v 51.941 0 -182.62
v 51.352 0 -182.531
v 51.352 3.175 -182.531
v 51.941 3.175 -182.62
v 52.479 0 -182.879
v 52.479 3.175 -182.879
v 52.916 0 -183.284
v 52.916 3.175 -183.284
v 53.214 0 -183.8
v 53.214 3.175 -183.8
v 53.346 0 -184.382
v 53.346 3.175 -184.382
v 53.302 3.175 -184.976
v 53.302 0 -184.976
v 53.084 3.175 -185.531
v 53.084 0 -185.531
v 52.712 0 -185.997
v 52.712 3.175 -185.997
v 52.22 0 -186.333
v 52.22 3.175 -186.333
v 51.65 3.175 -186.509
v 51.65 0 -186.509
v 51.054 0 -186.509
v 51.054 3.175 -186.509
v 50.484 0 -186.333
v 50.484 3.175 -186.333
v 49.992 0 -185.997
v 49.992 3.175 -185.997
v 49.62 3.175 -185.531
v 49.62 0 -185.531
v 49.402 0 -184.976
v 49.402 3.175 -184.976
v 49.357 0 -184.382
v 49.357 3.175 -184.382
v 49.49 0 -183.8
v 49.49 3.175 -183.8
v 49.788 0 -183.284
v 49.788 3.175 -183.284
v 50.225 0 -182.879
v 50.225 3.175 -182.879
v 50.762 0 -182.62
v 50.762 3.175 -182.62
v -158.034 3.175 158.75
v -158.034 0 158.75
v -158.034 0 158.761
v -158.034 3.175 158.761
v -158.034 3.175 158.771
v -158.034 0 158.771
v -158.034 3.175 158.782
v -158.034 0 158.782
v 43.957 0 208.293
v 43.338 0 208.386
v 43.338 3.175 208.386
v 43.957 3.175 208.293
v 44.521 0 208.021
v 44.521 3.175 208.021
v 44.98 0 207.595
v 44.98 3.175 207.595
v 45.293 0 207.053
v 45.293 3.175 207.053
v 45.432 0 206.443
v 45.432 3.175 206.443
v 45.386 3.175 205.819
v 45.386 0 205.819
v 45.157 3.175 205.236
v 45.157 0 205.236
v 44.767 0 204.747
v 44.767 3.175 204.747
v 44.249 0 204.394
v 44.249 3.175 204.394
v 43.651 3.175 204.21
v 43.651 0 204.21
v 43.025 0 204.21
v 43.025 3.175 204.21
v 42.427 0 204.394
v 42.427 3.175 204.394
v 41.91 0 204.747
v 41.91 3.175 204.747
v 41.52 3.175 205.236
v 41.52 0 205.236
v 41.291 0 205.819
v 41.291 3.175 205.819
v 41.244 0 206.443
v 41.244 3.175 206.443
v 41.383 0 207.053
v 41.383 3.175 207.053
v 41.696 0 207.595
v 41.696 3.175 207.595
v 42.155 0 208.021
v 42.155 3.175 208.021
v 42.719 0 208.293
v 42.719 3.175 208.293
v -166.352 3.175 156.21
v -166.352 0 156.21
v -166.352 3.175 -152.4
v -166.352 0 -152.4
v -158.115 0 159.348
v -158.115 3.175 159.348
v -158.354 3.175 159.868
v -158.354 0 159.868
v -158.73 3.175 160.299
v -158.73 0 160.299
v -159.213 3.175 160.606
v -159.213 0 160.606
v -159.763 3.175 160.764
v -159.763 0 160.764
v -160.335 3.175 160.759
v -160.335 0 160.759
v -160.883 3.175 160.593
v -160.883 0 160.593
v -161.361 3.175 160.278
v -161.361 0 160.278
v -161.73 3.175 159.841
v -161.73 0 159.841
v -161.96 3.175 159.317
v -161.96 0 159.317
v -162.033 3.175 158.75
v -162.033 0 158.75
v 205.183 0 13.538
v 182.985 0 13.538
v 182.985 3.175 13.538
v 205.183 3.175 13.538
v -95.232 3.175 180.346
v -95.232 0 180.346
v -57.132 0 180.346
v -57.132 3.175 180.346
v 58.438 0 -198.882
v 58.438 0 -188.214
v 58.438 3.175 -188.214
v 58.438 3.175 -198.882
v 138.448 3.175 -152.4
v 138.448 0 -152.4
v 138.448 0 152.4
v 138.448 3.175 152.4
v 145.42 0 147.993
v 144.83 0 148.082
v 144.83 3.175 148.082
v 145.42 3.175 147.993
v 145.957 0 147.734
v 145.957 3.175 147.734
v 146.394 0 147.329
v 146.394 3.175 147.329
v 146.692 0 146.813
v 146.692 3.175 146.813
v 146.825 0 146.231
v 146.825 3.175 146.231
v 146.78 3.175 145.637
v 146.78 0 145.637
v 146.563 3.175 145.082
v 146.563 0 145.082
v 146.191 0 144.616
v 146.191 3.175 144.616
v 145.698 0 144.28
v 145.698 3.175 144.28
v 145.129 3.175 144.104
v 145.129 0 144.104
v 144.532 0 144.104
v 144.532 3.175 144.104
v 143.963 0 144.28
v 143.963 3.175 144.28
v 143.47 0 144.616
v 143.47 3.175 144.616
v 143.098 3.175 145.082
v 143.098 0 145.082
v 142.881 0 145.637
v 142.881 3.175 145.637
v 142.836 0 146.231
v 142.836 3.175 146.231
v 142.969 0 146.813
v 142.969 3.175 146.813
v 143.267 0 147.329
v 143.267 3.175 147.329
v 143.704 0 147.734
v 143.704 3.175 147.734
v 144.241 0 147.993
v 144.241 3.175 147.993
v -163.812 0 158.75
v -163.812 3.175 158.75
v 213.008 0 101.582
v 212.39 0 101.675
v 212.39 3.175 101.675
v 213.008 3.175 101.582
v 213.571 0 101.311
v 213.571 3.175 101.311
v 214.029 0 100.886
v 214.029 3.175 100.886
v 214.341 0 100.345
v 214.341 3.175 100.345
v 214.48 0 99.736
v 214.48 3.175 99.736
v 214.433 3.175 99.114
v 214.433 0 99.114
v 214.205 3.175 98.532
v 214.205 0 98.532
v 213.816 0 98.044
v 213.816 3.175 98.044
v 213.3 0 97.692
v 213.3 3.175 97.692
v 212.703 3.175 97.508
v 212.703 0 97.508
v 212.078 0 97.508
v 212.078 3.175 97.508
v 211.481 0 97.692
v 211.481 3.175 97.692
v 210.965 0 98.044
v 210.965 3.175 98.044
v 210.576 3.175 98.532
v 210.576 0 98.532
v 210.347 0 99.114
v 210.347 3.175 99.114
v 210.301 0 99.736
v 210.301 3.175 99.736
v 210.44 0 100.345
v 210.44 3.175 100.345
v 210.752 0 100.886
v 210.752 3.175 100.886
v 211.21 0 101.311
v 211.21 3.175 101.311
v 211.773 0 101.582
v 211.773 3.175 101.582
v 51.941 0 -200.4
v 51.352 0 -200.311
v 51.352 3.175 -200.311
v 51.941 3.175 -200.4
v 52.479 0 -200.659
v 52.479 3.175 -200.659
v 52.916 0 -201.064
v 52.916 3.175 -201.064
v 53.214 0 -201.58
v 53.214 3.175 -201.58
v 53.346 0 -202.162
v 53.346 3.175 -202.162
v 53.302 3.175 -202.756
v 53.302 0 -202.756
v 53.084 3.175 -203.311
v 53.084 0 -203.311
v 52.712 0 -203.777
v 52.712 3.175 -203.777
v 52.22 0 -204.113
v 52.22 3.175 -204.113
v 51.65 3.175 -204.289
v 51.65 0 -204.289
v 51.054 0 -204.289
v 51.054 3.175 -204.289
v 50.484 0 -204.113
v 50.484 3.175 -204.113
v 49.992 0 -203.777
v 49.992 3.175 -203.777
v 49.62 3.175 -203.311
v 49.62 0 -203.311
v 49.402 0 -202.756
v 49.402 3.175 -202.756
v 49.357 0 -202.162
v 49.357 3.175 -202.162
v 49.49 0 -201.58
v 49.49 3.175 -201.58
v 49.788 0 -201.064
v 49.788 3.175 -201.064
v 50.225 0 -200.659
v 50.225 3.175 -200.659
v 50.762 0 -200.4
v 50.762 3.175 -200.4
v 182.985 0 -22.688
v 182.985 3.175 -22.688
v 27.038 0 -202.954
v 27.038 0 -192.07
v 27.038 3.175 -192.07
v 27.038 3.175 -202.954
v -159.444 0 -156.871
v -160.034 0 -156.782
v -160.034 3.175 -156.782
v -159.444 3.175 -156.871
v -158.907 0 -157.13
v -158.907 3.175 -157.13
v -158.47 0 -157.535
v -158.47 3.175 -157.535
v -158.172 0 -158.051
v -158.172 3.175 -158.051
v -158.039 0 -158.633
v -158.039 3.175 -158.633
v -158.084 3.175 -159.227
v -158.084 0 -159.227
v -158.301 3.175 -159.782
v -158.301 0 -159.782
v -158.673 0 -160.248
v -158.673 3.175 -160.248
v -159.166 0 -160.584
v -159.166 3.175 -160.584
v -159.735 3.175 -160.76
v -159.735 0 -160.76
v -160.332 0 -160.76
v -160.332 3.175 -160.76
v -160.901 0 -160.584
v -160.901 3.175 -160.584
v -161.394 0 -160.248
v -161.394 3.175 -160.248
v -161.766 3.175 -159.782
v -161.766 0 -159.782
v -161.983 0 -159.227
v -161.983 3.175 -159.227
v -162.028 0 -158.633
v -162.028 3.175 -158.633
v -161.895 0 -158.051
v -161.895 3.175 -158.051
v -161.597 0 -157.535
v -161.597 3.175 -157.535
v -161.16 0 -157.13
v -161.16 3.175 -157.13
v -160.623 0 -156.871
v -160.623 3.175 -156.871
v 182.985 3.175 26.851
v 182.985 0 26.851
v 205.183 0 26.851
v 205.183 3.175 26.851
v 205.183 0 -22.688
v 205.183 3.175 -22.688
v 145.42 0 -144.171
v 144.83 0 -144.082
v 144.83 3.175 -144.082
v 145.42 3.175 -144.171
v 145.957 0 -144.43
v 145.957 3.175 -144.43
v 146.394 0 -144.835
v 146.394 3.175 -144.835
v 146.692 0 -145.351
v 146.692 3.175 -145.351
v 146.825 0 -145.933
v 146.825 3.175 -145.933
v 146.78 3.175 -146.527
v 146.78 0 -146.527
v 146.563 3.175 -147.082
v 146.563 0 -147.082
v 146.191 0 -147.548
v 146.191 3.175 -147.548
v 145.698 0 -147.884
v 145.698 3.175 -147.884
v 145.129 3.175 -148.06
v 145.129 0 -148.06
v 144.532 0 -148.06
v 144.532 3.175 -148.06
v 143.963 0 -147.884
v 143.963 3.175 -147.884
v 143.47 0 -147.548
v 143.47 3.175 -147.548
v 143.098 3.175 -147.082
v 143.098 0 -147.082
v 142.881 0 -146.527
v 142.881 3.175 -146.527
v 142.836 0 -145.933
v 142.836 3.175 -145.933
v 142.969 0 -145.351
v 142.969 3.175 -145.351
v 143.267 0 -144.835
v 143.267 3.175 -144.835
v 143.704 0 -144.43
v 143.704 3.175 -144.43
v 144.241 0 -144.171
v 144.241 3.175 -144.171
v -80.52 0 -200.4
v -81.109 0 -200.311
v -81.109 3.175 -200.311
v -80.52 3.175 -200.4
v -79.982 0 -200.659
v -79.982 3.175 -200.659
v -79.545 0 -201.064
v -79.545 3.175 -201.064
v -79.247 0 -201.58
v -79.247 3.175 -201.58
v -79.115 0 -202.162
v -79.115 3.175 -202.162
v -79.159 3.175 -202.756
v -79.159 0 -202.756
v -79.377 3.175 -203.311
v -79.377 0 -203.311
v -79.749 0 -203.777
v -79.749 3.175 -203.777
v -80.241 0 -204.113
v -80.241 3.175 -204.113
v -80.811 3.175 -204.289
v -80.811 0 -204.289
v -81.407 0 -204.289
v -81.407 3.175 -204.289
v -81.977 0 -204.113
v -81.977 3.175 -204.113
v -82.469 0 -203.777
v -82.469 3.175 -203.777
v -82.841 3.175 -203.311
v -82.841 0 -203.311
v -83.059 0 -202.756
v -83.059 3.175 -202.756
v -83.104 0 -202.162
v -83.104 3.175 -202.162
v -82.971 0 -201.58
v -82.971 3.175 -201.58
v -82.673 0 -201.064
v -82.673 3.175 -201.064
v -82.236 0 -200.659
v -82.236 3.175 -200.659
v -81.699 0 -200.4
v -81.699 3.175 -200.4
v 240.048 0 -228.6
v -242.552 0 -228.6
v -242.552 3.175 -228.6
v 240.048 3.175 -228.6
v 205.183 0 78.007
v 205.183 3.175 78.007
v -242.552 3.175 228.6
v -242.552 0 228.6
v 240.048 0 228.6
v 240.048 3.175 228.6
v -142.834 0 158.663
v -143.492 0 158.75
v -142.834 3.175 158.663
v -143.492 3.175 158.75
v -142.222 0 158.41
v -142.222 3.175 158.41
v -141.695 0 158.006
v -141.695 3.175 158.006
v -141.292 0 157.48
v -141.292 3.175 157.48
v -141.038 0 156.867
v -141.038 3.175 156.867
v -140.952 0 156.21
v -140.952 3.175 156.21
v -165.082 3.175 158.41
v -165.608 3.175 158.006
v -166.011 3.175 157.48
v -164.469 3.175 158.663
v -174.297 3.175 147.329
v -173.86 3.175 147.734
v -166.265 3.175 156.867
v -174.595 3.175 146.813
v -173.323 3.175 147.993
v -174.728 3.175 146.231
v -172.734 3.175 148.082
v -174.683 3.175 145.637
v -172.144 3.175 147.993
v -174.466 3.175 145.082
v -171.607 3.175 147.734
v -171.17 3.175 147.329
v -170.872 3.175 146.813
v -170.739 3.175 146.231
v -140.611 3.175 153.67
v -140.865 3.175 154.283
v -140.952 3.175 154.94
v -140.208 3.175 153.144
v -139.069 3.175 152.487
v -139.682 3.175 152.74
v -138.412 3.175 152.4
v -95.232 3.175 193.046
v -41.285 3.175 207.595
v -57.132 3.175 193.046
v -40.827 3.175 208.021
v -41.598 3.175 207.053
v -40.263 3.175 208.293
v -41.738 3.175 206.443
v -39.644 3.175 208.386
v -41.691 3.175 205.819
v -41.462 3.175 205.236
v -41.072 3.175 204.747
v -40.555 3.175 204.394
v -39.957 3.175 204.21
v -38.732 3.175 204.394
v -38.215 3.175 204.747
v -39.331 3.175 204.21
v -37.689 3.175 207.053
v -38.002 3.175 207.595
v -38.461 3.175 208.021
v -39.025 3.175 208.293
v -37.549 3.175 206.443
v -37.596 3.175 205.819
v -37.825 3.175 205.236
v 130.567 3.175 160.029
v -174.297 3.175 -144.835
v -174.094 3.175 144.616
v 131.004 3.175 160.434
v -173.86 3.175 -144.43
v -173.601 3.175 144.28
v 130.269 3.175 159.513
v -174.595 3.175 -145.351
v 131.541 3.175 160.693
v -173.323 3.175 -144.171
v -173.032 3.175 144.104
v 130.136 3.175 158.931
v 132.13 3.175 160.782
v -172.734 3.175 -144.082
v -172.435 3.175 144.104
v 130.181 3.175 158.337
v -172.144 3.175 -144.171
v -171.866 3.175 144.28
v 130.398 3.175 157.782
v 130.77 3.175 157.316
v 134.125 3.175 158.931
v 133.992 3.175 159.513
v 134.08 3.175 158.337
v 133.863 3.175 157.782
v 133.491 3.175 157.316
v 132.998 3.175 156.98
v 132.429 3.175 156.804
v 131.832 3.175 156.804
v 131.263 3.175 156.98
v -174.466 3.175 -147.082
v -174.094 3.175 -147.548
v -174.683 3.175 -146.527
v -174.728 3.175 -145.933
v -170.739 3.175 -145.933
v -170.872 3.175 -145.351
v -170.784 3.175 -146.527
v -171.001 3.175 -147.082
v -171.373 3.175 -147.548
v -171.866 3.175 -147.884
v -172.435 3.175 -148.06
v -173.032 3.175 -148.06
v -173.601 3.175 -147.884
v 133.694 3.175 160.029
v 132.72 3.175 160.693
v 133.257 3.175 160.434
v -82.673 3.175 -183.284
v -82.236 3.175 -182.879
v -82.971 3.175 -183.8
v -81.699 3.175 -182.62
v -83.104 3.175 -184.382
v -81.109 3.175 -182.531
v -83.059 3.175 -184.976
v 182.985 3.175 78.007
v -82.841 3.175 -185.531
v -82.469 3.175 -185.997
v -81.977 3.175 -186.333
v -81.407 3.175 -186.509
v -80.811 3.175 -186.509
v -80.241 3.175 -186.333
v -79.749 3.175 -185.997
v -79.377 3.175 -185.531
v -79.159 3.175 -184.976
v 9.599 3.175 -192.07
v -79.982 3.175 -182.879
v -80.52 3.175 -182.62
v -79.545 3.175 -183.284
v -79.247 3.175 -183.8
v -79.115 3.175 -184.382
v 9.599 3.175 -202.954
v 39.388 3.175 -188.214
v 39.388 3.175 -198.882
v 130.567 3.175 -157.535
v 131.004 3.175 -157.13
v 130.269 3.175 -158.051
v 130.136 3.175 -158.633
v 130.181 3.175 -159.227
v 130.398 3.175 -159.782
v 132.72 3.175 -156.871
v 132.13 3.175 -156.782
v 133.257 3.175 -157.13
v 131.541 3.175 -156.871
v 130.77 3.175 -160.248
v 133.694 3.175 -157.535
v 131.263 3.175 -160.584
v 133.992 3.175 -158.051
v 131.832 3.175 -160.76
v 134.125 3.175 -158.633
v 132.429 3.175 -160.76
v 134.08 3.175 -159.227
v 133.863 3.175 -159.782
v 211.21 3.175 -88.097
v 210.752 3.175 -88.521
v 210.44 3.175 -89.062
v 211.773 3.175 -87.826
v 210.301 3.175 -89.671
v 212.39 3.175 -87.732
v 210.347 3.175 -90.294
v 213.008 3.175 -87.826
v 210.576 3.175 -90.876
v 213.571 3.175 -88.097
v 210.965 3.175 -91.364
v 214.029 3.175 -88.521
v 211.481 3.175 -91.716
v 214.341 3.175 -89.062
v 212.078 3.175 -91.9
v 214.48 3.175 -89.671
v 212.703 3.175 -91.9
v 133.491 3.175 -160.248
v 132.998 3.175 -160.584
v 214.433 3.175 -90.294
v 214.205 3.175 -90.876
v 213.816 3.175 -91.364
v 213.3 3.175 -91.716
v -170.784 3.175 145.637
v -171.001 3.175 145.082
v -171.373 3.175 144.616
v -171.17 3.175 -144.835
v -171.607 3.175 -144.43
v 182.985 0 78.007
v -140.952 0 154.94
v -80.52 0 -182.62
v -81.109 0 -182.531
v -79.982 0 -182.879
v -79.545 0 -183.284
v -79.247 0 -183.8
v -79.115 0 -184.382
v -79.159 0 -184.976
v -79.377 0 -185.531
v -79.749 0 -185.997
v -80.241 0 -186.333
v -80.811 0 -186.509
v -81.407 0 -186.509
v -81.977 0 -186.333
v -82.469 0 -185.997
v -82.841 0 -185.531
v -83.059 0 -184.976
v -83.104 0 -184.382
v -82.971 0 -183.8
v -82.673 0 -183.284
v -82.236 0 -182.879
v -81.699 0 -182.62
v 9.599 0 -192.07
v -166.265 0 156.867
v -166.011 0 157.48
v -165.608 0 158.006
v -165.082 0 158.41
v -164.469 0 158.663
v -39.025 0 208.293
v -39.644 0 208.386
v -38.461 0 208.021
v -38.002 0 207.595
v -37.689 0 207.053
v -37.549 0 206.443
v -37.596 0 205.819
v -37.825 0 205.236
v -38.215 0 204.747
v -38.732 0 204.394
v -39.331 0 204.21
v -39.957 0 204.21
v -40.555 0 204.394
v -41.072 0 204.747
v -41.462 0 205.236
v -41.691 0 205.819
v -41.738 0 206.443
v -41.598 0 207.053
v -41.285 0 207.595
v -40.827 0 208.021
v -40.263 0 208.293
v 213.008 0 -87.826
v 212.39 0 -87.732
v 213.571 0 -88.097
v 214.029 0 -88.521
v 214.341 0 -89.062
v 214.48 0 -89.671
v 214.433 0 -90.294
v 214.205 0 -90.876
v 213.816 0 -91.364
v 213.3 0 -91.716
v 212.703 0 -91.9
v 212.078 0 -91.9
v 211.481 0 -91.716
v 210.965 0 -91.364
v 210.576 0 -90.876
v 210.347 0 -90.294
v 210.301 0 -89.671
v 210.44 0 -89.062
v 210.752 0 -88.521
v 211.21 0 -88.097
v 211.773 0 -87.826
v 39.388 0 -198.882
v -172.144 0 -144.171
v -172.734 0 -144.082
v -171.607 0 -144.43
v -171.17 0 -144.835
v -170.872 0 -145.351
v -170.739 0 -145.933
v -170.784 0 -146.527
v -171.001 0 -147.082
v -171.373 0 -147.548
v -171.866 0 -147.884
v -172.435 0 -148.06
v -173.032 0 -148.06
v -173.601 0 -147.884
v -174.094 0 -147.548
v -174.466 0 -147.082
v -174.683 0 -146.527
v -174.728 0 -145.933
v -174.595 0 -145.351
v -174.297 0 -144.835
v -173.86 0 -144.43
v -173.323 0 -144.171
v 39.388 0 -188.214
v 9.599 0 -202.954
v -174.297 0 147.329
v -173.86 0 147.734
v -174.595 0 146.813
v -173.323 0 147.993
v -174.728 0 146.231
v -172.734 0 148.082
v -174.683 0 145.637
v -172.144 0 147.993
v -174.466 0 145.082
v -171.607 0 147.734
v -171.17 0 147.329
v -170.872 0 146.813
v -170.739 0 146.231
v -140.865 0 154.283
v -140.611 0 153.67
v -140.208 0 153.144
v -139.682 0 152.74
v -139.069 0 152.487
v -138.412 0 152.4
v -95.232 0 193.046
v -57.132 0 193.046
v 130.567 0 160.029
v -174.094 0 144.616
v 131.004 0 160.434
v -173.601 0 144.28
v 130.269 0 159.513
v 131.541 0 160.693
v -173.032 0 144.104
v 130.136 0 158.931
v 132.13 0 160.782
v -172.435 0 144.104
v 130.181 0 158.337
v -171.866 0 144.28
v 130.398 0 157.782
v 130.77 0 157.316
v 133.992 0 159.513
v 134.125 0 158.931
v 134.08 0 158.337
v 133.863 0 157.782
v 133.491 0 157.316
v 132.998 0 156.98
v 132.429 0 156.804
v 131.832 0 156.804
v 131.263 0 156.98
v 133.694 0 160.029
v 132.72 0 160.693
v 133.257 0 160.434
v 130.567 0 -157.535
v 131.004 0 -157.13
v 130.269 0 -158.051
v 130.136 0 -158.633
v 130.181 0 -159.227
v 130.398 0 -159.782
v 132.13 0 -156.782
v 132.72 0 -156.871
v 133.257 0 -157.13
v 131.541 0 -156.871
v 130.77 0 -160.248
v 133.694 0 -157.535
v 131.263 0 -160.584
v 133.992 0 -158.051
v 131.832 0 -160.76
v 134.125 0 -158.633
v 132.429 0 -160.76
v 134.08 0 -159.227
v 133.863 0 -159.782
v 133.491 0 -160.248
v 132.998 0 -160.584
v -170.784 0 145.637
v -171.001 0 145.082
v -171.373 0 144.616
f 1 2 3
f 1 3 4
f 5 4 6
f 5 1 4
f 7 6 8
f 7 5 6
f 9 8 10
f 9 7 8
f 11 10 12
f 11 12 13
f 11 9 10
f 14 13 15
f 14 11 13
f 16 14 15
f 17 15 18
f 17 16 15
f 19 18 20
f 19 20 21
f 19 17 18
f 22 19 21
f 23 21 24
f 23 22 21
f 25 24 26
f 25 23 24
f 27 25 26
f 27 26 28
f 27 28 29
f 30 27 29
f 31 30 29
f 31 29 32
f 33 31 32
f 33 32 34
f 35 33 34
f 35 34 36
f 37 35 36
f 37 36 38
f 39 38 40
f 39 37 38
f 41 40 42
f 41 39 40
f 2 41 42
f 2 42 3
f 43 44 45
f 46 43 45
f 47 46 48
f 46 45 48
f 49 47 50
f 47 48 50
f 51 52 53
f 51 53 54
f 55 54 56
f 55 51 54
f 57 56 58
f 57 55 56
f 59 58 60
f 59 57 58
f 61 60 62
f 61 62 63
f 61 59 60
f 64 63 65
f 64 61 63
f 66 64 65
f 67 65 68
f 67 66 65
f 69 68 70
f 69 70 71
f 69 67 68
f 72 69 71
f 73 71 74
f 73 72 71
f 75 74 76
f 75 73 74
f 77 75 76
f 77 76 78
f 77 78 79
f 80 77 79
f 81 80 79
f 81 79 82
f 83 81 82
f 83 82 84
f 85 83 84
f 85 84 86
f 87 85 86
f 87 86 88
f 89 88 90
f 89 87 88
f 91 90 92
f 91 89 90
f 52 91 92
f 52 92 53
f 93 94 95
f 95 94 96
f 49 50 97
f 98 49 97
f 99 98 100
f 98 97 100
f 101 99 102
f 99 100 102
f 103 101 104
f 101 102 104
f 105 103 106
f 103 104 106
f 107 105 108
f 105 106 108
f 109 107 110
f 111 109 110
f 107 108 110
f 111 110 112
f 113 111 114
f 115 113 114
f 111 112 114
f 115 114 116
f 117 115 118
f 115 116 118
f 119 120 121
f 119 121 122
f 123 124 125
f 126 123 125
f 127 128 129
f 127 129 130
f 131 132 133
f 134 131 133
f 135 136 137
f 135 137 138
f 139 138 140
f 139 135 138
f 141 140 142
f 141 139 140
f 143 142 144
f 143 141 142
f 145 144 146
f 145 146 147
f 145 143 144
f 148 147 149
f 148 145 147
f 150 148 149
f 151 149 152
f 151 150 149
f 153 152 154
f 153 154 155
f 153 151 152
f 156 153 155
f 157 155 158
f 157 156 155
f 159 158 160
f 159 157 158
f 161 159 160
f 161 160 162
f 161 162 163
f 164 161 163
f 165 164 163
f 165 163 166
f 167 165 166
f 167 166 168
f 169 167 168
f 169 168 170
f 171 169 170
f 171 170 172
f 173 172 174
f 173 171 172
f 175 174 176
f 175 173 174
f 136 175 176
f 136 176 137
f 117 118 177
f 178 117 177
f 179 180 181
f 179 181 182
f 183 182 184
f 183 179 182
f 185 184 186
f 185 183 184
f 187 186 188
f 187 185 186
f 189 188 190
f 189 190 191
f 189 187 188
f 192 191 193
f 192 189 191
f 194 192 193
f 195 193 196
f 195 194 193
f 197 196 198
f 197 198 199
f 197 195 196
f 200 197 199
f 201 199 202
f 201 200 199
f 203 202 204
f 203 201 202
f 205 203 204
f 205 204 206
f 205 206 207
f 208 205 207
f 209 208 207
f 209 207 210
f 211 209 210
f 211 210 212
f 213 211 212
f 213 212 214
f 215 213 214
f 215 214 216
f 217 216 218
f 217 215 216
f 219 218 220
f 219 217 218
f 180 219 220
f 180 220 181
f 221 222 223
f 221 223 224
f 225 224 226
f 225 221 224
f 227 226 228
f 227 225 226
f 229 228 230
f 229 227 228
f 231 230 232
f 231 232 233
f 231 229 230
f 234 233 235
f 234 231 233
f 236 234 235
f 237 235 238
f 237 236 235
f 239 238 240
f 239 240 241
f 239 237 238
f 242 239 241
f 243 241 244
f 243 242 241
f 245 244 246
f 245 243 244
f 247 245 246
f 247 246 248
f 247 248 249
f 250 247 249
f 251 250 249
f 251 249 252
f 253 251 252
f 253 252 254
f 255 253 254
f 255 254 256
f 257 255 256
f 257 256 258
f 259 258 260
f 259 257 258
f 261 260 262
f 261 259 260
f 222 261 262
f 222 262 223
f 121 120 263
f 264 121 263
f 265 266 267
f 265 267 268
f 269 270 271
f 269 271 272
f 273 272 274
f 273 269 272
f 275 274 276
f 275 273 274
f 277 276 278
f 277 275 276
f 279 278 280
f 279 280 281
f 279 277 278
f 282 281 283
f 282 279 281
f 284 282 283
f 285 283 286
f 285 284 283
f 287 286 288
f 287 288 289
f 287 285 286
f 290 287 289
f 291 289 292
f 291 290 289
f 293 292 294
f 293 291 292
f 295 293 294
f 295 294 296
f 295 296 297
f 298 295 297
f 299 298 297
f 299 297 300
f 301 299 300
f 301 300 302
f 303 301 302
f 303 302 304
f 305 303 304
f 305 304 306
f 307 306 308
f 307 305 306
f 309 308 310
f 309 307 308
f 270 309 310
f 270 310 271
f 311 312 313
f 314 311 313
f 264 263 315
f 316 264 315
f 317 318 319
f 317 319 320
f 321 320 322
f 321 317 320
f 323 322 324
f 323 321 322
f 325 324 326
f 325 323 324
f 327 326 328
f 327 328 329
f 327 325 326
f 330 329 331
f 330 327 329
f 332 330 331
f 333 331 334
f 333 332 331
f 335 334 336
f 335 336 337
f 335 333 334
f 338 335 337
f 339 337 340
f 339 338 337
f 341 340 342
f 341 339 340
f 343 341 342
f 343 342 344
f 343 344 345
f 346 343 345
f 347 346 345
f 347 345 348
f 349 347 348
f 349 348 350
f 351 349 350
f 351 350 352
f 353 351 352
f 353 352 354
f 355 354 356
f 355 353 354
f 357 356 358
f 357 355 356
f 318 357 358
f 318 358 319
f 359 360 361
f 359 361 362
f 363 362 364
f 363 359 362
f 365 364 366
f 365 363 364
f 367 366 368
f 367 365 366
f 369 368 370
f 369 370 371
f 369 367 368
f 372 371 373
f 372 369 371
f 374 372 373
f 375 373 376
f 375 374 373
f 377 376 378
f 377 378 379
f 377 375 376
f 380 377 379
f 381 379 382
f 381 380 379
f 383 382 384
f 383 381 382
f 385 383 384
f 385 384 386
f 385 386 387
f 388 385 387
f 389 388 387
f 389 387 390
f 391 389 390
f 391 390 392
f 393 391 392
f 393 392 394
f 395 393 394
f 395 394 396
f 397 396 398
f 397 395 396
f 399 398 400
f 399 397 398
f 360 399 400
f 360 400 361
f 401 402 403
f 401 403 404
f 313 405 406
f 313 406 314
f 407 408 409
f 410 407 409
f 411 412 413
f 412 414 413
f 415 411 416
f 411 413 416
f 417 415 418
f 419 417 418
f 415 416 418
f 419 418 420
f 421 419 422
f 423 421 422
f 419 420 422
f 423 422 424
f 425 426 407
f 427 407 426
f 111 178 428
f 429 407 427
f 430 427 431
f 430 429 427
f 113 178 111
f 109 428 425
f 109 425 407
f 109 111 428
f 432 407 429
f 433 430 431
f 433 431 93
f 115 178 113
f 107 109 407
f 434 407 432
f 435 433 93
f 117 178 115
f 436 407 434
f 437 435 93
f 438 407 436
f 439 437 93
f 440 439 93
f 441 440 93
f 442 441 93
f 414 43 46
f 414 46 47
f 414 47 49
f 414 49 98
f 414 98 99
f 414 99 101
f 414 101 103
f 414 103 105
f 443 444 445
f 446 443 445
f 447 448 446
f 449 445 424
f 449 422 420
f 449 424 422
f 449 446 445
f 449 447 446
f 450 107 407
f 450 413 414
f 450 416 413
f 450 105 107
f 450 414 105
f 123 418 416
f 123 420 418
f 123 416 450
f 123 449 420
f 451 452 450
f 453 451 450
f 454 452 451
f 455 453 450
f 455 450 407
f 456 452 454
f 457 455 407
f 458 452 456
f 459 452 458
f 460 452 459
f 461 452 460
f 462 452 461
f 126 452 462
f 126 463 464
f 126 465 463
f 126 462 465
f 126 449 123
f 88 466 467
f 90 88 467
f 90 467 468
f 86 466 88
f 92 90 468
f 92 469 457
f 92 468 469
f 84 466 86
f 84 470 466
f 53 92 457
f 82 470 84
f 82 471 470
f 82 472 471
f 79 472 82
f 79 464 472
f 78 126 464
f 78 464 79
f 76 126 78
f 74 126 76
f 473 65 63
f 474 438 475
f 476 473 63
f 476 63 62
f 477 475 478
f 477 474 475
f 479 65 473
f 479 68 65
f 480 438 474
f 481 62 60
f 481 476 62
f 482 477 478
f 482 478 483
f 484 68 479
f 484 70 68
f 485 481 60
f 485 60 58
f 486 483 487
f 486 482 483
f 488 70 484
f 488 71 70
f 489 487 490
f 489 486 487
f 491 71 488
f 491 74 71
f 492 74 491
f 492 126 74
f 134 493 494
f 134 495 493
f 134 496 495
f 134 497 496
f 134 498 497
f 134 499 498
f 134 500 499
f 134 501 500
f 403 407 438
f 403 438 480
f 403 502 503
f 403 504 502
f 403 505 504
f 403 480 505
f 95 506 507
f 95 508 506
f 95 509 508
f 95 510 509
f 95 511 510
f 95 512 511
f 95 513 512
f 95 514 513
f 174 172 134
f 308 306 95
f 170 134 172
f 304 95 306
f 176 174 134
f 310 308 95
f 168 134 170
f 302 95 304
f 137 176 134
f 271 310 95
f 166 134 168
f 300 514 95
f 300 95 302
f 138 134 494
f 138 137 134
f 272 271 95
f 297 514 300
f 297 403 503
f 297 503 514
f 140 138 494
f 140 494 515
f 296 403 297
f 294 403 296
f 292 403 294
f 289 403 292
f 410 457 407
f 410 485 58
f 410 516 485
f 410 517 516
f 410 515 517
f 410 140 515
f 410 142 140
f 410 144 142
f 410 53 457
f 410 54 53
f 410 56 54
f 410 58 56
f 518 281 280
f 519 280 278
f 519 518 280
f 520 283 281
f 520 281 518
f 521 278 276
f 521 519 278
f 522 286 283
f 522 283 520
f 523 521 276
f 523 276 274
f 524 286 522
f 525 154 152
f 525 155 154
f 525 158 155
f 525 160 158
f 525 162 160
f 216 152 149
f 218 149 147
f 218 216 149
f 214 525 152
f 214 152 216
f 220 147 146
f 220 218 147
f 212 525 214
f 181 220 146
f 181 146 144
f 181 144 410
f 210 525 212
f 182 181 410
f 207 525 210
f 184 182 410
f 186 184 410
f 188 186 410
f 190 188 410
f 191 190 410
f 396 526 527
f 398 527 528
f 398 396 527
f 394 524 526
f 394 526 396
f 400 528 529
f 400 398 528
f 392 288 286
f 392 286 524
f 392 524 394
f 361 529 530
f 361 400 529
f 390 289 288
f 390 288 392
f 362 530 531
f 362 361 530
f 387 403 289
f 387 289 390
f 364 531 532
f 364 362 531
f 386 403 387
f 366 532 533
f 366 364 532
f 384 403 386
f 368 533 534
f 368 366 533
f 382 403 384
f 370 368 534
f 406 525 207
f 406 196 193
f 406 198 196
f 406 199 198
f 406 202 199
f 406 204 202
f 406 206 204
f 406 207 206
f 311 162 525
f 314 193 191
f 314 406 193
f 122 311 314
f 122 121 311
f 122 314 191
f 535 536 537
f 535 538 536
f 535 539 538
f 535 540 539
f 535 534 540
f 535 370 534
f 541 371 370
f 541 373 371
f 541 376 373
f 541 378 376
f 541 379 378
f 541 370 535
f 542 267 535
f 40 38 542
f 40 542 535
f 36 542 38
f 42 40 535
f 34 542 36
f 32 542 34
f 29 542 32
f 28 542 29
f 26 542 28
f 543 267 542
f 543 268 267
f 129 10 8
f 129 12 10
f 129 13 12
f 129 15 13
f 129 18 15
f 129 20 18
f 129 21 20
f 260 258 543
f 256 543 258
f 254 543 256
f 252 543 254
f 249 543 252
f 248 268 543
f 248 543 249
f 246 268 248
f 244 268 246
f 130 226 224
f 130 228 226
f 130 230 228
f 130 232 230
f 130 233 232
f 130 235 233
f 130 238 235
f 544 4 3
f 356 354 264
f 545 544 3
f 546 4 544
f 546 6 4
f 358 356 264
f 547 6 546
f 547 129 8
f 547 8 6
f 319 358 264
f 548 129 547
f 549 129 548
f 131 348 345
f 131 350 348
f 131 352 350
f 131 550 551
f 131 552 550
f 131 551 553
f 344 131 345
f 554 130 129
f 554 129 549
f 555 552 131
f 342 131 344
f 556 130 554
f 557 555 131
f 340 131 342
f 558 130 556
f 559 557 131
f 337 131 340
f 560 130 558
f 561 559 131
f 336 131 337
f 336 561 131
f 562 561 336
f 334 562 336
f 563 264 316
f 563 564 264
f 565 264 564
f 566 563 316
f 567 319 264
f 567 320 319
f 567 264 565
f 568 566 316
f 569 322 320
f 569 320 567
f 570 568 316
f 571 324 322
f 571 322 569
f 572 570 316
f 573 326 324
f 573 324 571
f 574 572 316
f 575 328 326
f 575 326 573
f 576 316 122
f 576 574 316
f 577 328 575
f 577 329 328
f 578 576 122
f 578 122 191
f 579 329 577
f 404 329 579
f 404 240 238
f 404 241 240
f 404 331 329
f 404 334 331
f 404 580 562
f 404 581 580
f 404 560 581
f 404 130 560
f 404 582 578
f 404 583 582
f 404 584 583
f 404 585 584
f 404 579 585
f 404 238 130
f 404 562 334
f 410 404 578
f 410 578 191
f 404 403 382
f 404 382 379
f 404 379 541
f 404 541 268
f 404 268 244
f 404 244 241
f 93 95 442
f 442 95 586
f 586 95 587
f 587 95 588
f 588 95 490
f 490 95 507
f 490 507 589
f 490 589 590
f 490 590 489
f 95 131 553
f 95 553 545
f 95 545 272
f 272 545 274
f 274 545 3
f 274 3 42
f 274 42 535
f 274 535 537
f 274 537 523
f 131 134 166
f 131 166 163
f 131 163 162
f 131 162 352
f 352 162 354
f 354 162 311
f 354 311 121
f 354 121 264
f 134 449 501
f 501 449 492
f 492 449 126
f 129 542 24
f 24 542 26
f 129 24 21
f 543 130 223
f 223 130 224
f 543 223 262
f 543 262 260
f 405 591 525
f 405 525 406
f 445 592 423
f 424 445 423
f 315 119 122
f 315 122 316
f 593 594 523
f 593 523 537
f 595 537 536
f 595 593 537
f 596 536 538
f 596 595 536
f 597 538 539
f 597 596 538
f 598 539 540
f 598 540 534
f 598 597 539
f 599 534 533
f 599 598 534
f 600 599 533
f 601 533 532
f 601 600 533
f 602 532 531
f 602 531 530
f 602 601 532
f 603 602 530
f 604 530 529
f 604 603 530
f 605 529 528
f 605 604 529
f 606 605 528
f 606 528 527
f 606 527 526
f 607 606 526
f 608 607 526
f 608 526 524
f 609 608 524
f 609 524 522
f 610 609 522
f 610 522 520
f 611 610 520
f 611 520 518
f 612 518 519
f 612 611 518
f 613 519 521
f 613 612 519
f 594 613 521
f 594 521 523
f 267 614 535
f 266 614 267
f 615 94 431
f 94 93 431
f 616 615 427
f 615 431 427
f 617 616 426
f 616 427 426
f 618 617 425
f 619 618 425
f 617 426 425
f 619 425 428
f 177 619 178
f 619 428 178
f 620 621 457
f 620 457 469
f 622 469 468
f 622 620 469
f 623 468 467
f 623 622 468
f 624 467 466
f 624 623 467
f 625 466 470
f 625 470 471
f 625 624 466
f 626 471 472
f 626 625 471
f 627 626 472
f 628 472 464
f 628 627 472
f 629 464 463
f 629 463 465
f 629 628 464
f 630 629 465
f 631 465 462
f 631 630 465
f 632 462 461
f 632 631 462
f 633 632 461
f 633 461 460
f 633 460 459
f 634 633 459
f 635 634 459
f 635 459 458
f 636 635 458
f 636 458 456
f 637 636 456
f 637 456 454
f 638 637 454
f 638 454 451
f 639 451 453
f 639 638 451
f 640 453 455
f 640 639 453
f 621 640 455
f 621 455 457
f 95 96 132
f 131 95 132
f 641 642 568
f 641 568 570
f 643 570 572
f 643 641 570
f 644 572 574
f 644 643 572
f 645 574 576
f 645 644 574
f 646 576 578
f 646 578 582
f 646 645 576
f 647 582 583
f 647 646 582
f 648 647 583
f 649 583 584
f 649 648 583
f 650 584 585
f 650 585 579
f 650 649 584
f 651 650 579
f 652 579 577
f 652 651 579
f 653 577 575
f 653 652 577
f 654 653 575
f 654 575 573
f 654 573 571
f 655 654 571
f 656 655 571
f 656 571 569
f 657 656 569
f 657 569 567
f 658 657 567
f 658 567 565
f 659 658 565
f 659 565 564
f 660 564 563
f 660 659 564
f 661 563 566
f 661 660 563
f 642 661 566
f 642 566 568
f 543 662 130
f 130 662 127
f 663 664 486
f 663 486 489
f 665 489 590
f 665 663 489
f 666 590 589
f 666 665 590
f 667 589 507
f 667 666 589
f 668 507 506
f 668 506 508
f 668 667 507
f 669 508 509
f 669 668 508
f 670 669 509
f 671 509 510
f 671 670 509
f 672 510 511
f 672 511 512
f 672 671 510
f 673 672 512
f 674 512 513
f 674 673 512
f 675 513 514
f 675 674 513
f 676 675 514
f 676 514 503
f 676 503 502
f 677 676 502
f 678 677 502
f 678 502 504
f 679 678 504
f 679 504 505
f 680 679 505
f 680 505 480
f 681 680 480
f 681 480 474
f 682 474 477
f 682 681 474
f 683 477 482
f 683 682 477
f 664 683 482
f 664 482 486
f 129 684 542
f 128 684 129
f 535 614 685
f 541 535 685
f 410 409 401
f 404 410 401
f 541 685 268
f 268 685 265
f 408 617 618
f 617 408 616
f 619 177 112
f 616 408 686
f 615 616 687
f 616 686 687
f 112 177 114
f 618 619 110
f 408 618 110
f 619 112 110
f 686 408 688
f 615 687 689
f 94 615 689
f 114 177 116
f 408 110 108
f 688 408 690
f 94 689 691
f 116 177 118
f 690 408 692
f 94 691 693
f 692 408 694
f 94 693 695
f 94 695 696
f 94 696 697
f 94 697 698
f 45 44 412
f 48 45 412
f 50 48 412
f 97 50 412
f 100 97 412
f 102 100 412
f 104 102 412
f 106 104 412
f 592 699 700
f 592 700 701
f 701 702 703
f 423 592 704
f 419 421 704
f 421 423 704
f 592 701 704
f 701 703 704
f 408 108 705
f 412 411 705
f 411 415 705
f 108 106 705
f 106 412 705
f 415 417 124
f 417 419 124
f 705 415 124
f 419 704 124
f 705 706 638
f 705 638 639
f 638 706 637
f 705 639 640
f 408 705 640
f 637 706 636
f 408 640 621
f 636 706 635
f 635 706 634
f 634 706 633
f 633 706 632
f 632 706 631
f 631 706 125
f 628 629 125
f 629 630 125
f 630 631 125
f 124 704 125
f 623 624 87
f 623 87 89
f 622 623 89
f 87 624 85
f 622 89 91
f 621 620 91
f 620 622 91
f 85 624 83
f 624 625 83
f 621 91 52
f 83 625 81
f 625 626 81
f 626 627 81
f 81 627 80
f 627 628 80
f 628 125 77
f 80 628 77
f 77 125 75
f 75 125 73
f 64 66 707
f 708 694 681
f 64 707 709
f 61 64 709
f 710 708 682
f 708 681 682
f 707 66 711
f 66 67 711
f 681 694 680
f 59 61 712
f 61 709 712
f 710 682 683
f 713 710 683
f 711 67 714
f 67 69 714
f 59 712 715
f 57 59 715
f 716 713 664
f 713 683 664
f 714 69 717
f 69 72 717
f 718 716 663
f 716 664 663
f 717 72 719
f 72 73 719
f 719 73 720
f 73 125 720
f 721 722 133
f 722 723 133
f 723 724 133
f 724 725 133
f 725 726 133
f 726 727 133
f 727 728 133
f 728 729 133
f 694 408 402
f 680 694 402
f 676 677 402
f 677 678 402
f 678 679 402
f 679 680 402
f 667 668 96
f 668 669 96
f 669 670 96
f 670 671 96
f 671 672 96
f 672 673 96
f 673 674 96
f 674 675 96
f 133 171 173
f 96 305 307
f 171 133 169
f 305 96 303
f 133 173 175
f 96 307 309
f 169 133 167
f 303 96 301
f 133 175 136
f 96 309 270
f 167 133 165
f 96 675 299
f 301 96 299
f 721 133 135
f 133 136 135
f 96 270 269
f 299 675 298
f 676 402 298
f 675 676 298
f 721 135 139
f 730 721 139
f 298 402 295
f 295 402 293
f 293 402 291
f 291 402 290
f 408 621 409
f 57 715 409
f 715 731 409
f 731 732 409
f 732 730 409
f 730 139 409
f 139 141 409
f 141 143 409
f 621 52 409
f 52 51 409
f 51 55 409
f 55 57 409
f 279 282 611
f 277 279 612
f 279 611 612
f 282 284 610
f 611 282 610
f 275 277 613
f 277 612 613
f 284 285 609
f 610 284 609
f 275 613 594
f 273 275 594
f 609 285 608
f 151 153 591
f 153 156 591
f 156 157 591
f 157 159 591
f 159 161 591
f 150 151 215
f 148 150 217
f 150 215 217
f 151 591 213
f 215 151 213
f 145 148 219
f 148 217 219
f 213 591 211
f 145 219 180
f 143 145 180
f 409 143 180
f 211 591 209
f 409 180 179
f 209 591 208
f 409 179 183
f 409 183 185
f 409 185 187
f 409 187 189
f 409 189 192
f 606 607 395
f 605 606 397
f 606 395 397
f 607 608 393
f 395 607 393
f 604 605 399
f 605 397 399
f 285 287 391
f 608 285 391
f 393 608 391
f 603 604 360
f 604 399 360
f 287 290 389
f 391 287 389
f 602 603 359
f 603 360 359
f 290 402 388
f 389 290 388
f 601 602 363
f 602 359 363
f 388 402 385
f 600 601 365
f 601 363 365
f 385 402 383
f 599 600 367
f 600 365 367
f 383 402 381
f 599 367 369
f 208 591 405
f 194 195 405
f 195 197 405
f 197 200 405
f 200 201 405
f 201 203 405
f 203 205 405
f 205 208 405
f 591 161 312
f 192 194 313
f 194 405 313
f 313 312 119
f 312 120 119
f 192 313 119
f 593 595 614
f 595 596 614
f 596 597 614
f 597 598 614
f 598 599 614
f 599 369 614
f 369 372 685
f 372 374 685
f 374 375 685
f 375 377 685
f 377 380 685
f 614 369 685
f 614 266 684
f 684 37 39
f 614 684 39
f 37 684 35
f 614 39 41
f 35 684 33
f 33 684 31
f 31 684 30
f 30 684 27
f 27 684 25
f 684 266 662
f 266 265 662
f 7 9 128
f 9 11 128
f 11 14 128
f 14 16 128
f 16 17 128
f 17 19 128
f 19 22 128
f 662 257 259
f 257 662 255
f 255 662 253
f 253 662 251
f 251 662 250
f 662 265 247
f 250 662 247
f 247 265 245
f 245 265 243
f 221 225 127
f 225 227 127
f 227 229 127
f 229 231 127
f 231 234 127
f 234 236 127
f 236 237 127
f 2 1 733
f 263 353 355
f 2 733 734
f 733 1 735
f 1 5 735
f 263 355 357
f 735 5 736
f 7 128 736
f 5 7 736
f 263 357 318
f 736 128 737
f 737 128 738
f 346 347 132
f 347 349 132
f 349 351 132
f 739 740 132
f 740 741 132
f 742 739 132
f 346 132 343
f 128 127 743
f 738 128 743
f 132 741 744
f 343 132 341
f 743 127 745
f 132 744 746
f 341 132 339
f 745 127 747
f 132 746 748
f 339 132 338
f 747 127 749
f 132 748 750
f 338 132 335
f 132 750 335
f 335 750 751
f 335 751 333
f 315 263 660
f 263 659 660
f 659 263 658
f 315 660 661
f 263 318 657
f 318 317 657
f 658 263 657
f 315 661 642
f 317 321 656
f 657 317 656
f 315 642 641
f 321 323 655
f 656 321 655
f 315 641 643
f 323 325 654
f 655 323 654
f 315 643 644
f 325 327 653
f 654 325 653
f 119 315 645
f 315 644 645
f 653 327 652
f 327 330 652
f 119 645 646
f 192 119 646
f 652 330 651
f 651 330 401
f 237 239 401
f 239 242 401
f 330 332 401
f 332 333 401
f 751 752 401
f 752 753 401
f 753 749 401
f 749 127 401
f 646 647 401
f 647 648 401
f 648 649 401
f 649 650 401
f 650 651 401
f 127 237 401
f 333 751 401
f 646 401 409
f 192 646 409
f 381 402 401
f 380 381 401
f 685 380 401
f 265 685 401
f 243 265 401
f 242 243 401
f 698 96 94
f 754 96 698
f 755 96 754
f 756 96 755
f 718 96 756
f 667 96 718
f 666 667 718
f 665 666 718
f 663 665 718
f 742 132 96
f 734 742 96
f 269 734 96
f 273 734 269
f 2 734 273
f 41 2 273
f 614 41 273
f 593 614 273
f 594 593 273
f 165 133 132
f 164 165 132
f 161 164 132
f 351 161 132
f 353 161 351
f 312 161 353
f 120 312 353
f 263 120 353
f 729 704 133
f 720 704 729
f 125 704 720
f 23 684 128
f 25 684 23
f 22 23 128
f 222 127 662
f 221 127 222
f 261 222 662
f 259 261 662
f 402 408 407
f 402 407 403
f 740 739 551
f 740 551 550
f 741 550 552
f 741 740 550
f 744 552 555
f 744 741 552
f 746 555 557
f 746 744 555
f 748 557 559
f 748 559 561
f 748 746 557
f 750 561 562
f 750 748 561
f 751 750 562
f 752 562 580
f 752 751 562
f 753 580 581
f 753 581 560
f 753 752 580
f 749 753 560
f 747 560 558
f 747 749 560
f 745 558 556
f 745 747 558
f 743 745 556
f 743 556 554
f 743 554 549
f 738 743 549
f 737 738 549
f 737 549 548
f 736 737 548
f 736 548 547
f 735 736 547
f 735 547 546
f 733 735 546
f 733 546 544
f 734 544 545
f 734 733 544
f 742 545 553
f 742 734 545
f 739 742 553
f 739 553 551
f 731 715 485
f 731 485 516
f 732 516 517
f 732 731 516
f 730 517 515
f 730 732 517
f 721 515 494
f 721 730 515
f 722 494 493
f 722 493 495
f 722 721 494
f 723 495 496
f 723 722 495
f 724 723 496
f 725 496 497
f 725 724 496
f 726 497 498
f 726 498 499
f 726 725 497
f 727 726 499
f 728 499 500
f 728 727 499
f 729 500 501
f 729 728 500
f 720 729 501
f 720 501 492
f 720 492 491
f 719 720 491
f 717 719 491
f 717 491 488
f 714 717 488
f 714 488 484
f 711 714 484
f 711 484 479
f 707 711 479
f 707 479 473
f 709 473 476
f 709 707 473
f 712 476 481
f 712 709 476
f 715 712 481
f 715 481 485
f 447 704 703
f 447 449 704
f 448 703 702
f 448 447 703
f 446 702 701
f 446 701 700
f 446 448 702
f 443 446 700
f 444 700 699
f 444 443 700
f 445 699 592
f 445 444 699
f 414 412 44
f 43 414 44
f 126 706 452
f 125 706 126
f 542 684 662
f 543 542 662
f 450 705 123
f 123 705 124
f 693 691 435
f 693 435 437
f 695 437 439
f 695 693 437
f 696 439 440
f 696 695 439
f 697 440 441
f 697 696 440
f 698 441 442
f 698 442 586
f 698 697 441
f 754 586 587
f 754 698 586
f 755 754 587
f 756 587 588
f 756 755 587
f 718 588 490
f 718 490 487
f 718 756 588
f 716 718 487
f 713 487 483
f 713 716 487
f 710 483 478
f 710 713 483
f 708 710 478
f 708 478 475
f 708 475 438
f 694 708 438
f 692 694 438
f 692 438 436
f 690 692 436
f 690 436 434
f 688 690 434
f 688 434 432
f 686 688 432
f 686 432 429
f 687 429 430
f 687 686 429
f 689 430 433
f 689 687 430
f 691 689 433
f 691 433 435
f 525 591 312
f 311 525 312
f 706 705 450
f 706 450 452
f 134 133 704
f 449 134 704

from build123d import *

# Parameters (mm, degrees)
SKETCH1_W           = 482.6
SKETCH1_H           = 457.2
SKETCH1_R           = 2
SKETCH1_W_2         = 38.1
SKETCH1_H_2         = 12.7
SKETCH1_R_2         = 2.1
SKETCH1_R_3         = 2.0955
SKETCH1_W_3         = 22.197164078
SKETCH1_H_3         = 51.155633978
SKETCH1_H_4         = 36.225516101
SKETCH1_W_4         = 17.438820998
SKETCH1_H_5         = 10.883645004
SKETCH1_W_5         = 19.05
SKETCH1_H_6         = 10.668
BOSS_EXTRUDE1_DEPTH = 3.175
FILLET1_R           = 2.54


with BuildPart() as part:
    # Sketch1 → Boss-Extrude1 (new body)
    with BuildSketch(Plane(origin=(0, 0, 0), x_dir=(1, 0, 0), z_dir=(0, 1, 0))):
        with Locations((-1.251503591, 0)):
            Rectangle(SKETCH1_W, SKETCH1_H)
        with Locations(Location((-172.733503591, -146.082, 0), (0, 0, 270))):
            Circle(SKETCH1_R, mode=Mode.SUBTRACT)
        with Locations((-76.181503591, -186.695610311)):
            Rectangle(SKETCH1_W_2, SKETCH1_H_2, mode=Mode.SUBTRACT)
        with Locations(Location((-39.643603591, -206.2861, 0), (0, 0, 270))):
            Circle(SKETCH1_R_2, mode=Mode.SUBTRACT)
        with BuildLine():
            Line((-166.351503591, -152.4), (-166.351503591, 152.4))
            Line((-166.351503591, 152.4), (138.448496409, 152.4))
            Line((138.448496409, 152.4), (138.448496409, -152.4))
            Line((138.448496409, -152.4), (-140.951503591, -152.4))
            Line((-140.951503591, -152.4), (-140.951503591, -158.75))
            Line((-140.951503591, -158.75), (-158.033759607, -158.75))
            ThreePointArc((-158.033759607, -158.75), (-158.033567596, -158.765999488), (-158.033503591, -158.782))
            ThreePointArc((-158.033503591, -158.782), (-160.049504103, -160.781935995), (-162.033247575, -158.75))
            Line((-162.033247575, -158.75), (-166.351503591, -158.75))
            Line((-166.351503591, -158.75), (-166.351503591, -152.4))
        make_face(mode=Mode.SUBTRACT)
        with Locations(Location((43.338196409, -206.2861, 0), (0, 0, 270))):
            Circle(SKETCH1_R_2, mode=Mode.SUBTRACT)
        with Locations(Location((132.130496409, -158.782, 0), (0, 0, 270))):
            Circle(SKETCH1_R, mode=Mode.SUBTRACT)
        with Locations(Location((144.830496409, -146.082, 0), (0, 0, 270))):
            Circle(SKETCH1_R, mode=Mode.SUBTRACT)
        with Locations(Location((212.390436409, -99.579800078, 0), (0, 0, 270))):
            Circle(SKETCH1_R_3, mode=Mode.SUBTRACT)
        with Locations((194.083935921, -52.428980659)):
            Rectangle(SKETCH1_W_3, SKETCH1_H_3, mode=Mode.SUBTRACT)
        with Locations(Location((-172.733503591, 146.082, 0), (0, 0, 270))):
            Circle(SKETCH1_R, mode=Mode.SUBTRACT)
        with Locations(Location((-160.033503591, 158.782, 0), (0, 0, 270))):
            Circle(SKETCH1_R, mode=Mode.SUBTRACT)
        with Locations(Location((-81.109103591, 184.531, 0), (0, 0, 270))):
            Circle(SKETCH1_R, mode=Mode.SUBTRACT)
        with Locations(Location((-81.109103591, 202.311, 0), (0, 0, 270))):
            Circle(SKETCH1_R, mode=Mode.SUBTRACT)
        with Locations((194.083935921, 4.575109653)):
            Rectangle(SKETCH1_W_3, SKETCH1_H_4, mode=Mode.SUBTRACT)
        with Locations(Location((212.390436409, 89.827999922, 0), (0, 0, 270))):
            Circle(SKETCH1_R_3, mode=Mode.SUBTRACT)
        with Locations((18.318465636, 197.512214728)):
            Rectangle(SKETCH1_W_4, SKETCH1_H_5, mode=Mode.SUBTRACT)
        with Locations(Location((51.351896409, 184.531, 0), (0, 0, 270))):
            Circle(SKETCH1_R, mode=Mode.SUBTRACT)
        with Locations((48.913496409, 193.548)):
            Rectangle(SKETCH1_W_5, SKETCH1_H_6, mode=Mode.SUBTRACT)
        with Locations(Location((51.351896409, 202.311, 0), (0, 0, 270))):
            Circle(SKETCH1_R, mode=Mode.SUBTRACT)
        with Locations(Location((144.830496409, 146.082, 0), (0, 0, 270))):
            Circle(SKETCH1_R, mode=Mode.SUBTRACT)
        with Locations(Location((132.130496409, 158.782, 0), (0, 0, 270))):
            Circle(SKETCH1_R, mode=Mode.SUBTRACT)
    extrude(amount=BOSS_EXTRUDE1_DEPTH)

    # Fillet1
    fillet1_edges = [part.edges().sort_by_distance(p)[0] for p in [
        (-140.951503591, 1.5875, 158.75),
        (-140.951503591, 1.5875, 152.4),
        (-166.351503591, 1.5875, 158.75),
    ]]
    fillet(fillet1_edges, radius=FILLET1_R)


solid = part.part
